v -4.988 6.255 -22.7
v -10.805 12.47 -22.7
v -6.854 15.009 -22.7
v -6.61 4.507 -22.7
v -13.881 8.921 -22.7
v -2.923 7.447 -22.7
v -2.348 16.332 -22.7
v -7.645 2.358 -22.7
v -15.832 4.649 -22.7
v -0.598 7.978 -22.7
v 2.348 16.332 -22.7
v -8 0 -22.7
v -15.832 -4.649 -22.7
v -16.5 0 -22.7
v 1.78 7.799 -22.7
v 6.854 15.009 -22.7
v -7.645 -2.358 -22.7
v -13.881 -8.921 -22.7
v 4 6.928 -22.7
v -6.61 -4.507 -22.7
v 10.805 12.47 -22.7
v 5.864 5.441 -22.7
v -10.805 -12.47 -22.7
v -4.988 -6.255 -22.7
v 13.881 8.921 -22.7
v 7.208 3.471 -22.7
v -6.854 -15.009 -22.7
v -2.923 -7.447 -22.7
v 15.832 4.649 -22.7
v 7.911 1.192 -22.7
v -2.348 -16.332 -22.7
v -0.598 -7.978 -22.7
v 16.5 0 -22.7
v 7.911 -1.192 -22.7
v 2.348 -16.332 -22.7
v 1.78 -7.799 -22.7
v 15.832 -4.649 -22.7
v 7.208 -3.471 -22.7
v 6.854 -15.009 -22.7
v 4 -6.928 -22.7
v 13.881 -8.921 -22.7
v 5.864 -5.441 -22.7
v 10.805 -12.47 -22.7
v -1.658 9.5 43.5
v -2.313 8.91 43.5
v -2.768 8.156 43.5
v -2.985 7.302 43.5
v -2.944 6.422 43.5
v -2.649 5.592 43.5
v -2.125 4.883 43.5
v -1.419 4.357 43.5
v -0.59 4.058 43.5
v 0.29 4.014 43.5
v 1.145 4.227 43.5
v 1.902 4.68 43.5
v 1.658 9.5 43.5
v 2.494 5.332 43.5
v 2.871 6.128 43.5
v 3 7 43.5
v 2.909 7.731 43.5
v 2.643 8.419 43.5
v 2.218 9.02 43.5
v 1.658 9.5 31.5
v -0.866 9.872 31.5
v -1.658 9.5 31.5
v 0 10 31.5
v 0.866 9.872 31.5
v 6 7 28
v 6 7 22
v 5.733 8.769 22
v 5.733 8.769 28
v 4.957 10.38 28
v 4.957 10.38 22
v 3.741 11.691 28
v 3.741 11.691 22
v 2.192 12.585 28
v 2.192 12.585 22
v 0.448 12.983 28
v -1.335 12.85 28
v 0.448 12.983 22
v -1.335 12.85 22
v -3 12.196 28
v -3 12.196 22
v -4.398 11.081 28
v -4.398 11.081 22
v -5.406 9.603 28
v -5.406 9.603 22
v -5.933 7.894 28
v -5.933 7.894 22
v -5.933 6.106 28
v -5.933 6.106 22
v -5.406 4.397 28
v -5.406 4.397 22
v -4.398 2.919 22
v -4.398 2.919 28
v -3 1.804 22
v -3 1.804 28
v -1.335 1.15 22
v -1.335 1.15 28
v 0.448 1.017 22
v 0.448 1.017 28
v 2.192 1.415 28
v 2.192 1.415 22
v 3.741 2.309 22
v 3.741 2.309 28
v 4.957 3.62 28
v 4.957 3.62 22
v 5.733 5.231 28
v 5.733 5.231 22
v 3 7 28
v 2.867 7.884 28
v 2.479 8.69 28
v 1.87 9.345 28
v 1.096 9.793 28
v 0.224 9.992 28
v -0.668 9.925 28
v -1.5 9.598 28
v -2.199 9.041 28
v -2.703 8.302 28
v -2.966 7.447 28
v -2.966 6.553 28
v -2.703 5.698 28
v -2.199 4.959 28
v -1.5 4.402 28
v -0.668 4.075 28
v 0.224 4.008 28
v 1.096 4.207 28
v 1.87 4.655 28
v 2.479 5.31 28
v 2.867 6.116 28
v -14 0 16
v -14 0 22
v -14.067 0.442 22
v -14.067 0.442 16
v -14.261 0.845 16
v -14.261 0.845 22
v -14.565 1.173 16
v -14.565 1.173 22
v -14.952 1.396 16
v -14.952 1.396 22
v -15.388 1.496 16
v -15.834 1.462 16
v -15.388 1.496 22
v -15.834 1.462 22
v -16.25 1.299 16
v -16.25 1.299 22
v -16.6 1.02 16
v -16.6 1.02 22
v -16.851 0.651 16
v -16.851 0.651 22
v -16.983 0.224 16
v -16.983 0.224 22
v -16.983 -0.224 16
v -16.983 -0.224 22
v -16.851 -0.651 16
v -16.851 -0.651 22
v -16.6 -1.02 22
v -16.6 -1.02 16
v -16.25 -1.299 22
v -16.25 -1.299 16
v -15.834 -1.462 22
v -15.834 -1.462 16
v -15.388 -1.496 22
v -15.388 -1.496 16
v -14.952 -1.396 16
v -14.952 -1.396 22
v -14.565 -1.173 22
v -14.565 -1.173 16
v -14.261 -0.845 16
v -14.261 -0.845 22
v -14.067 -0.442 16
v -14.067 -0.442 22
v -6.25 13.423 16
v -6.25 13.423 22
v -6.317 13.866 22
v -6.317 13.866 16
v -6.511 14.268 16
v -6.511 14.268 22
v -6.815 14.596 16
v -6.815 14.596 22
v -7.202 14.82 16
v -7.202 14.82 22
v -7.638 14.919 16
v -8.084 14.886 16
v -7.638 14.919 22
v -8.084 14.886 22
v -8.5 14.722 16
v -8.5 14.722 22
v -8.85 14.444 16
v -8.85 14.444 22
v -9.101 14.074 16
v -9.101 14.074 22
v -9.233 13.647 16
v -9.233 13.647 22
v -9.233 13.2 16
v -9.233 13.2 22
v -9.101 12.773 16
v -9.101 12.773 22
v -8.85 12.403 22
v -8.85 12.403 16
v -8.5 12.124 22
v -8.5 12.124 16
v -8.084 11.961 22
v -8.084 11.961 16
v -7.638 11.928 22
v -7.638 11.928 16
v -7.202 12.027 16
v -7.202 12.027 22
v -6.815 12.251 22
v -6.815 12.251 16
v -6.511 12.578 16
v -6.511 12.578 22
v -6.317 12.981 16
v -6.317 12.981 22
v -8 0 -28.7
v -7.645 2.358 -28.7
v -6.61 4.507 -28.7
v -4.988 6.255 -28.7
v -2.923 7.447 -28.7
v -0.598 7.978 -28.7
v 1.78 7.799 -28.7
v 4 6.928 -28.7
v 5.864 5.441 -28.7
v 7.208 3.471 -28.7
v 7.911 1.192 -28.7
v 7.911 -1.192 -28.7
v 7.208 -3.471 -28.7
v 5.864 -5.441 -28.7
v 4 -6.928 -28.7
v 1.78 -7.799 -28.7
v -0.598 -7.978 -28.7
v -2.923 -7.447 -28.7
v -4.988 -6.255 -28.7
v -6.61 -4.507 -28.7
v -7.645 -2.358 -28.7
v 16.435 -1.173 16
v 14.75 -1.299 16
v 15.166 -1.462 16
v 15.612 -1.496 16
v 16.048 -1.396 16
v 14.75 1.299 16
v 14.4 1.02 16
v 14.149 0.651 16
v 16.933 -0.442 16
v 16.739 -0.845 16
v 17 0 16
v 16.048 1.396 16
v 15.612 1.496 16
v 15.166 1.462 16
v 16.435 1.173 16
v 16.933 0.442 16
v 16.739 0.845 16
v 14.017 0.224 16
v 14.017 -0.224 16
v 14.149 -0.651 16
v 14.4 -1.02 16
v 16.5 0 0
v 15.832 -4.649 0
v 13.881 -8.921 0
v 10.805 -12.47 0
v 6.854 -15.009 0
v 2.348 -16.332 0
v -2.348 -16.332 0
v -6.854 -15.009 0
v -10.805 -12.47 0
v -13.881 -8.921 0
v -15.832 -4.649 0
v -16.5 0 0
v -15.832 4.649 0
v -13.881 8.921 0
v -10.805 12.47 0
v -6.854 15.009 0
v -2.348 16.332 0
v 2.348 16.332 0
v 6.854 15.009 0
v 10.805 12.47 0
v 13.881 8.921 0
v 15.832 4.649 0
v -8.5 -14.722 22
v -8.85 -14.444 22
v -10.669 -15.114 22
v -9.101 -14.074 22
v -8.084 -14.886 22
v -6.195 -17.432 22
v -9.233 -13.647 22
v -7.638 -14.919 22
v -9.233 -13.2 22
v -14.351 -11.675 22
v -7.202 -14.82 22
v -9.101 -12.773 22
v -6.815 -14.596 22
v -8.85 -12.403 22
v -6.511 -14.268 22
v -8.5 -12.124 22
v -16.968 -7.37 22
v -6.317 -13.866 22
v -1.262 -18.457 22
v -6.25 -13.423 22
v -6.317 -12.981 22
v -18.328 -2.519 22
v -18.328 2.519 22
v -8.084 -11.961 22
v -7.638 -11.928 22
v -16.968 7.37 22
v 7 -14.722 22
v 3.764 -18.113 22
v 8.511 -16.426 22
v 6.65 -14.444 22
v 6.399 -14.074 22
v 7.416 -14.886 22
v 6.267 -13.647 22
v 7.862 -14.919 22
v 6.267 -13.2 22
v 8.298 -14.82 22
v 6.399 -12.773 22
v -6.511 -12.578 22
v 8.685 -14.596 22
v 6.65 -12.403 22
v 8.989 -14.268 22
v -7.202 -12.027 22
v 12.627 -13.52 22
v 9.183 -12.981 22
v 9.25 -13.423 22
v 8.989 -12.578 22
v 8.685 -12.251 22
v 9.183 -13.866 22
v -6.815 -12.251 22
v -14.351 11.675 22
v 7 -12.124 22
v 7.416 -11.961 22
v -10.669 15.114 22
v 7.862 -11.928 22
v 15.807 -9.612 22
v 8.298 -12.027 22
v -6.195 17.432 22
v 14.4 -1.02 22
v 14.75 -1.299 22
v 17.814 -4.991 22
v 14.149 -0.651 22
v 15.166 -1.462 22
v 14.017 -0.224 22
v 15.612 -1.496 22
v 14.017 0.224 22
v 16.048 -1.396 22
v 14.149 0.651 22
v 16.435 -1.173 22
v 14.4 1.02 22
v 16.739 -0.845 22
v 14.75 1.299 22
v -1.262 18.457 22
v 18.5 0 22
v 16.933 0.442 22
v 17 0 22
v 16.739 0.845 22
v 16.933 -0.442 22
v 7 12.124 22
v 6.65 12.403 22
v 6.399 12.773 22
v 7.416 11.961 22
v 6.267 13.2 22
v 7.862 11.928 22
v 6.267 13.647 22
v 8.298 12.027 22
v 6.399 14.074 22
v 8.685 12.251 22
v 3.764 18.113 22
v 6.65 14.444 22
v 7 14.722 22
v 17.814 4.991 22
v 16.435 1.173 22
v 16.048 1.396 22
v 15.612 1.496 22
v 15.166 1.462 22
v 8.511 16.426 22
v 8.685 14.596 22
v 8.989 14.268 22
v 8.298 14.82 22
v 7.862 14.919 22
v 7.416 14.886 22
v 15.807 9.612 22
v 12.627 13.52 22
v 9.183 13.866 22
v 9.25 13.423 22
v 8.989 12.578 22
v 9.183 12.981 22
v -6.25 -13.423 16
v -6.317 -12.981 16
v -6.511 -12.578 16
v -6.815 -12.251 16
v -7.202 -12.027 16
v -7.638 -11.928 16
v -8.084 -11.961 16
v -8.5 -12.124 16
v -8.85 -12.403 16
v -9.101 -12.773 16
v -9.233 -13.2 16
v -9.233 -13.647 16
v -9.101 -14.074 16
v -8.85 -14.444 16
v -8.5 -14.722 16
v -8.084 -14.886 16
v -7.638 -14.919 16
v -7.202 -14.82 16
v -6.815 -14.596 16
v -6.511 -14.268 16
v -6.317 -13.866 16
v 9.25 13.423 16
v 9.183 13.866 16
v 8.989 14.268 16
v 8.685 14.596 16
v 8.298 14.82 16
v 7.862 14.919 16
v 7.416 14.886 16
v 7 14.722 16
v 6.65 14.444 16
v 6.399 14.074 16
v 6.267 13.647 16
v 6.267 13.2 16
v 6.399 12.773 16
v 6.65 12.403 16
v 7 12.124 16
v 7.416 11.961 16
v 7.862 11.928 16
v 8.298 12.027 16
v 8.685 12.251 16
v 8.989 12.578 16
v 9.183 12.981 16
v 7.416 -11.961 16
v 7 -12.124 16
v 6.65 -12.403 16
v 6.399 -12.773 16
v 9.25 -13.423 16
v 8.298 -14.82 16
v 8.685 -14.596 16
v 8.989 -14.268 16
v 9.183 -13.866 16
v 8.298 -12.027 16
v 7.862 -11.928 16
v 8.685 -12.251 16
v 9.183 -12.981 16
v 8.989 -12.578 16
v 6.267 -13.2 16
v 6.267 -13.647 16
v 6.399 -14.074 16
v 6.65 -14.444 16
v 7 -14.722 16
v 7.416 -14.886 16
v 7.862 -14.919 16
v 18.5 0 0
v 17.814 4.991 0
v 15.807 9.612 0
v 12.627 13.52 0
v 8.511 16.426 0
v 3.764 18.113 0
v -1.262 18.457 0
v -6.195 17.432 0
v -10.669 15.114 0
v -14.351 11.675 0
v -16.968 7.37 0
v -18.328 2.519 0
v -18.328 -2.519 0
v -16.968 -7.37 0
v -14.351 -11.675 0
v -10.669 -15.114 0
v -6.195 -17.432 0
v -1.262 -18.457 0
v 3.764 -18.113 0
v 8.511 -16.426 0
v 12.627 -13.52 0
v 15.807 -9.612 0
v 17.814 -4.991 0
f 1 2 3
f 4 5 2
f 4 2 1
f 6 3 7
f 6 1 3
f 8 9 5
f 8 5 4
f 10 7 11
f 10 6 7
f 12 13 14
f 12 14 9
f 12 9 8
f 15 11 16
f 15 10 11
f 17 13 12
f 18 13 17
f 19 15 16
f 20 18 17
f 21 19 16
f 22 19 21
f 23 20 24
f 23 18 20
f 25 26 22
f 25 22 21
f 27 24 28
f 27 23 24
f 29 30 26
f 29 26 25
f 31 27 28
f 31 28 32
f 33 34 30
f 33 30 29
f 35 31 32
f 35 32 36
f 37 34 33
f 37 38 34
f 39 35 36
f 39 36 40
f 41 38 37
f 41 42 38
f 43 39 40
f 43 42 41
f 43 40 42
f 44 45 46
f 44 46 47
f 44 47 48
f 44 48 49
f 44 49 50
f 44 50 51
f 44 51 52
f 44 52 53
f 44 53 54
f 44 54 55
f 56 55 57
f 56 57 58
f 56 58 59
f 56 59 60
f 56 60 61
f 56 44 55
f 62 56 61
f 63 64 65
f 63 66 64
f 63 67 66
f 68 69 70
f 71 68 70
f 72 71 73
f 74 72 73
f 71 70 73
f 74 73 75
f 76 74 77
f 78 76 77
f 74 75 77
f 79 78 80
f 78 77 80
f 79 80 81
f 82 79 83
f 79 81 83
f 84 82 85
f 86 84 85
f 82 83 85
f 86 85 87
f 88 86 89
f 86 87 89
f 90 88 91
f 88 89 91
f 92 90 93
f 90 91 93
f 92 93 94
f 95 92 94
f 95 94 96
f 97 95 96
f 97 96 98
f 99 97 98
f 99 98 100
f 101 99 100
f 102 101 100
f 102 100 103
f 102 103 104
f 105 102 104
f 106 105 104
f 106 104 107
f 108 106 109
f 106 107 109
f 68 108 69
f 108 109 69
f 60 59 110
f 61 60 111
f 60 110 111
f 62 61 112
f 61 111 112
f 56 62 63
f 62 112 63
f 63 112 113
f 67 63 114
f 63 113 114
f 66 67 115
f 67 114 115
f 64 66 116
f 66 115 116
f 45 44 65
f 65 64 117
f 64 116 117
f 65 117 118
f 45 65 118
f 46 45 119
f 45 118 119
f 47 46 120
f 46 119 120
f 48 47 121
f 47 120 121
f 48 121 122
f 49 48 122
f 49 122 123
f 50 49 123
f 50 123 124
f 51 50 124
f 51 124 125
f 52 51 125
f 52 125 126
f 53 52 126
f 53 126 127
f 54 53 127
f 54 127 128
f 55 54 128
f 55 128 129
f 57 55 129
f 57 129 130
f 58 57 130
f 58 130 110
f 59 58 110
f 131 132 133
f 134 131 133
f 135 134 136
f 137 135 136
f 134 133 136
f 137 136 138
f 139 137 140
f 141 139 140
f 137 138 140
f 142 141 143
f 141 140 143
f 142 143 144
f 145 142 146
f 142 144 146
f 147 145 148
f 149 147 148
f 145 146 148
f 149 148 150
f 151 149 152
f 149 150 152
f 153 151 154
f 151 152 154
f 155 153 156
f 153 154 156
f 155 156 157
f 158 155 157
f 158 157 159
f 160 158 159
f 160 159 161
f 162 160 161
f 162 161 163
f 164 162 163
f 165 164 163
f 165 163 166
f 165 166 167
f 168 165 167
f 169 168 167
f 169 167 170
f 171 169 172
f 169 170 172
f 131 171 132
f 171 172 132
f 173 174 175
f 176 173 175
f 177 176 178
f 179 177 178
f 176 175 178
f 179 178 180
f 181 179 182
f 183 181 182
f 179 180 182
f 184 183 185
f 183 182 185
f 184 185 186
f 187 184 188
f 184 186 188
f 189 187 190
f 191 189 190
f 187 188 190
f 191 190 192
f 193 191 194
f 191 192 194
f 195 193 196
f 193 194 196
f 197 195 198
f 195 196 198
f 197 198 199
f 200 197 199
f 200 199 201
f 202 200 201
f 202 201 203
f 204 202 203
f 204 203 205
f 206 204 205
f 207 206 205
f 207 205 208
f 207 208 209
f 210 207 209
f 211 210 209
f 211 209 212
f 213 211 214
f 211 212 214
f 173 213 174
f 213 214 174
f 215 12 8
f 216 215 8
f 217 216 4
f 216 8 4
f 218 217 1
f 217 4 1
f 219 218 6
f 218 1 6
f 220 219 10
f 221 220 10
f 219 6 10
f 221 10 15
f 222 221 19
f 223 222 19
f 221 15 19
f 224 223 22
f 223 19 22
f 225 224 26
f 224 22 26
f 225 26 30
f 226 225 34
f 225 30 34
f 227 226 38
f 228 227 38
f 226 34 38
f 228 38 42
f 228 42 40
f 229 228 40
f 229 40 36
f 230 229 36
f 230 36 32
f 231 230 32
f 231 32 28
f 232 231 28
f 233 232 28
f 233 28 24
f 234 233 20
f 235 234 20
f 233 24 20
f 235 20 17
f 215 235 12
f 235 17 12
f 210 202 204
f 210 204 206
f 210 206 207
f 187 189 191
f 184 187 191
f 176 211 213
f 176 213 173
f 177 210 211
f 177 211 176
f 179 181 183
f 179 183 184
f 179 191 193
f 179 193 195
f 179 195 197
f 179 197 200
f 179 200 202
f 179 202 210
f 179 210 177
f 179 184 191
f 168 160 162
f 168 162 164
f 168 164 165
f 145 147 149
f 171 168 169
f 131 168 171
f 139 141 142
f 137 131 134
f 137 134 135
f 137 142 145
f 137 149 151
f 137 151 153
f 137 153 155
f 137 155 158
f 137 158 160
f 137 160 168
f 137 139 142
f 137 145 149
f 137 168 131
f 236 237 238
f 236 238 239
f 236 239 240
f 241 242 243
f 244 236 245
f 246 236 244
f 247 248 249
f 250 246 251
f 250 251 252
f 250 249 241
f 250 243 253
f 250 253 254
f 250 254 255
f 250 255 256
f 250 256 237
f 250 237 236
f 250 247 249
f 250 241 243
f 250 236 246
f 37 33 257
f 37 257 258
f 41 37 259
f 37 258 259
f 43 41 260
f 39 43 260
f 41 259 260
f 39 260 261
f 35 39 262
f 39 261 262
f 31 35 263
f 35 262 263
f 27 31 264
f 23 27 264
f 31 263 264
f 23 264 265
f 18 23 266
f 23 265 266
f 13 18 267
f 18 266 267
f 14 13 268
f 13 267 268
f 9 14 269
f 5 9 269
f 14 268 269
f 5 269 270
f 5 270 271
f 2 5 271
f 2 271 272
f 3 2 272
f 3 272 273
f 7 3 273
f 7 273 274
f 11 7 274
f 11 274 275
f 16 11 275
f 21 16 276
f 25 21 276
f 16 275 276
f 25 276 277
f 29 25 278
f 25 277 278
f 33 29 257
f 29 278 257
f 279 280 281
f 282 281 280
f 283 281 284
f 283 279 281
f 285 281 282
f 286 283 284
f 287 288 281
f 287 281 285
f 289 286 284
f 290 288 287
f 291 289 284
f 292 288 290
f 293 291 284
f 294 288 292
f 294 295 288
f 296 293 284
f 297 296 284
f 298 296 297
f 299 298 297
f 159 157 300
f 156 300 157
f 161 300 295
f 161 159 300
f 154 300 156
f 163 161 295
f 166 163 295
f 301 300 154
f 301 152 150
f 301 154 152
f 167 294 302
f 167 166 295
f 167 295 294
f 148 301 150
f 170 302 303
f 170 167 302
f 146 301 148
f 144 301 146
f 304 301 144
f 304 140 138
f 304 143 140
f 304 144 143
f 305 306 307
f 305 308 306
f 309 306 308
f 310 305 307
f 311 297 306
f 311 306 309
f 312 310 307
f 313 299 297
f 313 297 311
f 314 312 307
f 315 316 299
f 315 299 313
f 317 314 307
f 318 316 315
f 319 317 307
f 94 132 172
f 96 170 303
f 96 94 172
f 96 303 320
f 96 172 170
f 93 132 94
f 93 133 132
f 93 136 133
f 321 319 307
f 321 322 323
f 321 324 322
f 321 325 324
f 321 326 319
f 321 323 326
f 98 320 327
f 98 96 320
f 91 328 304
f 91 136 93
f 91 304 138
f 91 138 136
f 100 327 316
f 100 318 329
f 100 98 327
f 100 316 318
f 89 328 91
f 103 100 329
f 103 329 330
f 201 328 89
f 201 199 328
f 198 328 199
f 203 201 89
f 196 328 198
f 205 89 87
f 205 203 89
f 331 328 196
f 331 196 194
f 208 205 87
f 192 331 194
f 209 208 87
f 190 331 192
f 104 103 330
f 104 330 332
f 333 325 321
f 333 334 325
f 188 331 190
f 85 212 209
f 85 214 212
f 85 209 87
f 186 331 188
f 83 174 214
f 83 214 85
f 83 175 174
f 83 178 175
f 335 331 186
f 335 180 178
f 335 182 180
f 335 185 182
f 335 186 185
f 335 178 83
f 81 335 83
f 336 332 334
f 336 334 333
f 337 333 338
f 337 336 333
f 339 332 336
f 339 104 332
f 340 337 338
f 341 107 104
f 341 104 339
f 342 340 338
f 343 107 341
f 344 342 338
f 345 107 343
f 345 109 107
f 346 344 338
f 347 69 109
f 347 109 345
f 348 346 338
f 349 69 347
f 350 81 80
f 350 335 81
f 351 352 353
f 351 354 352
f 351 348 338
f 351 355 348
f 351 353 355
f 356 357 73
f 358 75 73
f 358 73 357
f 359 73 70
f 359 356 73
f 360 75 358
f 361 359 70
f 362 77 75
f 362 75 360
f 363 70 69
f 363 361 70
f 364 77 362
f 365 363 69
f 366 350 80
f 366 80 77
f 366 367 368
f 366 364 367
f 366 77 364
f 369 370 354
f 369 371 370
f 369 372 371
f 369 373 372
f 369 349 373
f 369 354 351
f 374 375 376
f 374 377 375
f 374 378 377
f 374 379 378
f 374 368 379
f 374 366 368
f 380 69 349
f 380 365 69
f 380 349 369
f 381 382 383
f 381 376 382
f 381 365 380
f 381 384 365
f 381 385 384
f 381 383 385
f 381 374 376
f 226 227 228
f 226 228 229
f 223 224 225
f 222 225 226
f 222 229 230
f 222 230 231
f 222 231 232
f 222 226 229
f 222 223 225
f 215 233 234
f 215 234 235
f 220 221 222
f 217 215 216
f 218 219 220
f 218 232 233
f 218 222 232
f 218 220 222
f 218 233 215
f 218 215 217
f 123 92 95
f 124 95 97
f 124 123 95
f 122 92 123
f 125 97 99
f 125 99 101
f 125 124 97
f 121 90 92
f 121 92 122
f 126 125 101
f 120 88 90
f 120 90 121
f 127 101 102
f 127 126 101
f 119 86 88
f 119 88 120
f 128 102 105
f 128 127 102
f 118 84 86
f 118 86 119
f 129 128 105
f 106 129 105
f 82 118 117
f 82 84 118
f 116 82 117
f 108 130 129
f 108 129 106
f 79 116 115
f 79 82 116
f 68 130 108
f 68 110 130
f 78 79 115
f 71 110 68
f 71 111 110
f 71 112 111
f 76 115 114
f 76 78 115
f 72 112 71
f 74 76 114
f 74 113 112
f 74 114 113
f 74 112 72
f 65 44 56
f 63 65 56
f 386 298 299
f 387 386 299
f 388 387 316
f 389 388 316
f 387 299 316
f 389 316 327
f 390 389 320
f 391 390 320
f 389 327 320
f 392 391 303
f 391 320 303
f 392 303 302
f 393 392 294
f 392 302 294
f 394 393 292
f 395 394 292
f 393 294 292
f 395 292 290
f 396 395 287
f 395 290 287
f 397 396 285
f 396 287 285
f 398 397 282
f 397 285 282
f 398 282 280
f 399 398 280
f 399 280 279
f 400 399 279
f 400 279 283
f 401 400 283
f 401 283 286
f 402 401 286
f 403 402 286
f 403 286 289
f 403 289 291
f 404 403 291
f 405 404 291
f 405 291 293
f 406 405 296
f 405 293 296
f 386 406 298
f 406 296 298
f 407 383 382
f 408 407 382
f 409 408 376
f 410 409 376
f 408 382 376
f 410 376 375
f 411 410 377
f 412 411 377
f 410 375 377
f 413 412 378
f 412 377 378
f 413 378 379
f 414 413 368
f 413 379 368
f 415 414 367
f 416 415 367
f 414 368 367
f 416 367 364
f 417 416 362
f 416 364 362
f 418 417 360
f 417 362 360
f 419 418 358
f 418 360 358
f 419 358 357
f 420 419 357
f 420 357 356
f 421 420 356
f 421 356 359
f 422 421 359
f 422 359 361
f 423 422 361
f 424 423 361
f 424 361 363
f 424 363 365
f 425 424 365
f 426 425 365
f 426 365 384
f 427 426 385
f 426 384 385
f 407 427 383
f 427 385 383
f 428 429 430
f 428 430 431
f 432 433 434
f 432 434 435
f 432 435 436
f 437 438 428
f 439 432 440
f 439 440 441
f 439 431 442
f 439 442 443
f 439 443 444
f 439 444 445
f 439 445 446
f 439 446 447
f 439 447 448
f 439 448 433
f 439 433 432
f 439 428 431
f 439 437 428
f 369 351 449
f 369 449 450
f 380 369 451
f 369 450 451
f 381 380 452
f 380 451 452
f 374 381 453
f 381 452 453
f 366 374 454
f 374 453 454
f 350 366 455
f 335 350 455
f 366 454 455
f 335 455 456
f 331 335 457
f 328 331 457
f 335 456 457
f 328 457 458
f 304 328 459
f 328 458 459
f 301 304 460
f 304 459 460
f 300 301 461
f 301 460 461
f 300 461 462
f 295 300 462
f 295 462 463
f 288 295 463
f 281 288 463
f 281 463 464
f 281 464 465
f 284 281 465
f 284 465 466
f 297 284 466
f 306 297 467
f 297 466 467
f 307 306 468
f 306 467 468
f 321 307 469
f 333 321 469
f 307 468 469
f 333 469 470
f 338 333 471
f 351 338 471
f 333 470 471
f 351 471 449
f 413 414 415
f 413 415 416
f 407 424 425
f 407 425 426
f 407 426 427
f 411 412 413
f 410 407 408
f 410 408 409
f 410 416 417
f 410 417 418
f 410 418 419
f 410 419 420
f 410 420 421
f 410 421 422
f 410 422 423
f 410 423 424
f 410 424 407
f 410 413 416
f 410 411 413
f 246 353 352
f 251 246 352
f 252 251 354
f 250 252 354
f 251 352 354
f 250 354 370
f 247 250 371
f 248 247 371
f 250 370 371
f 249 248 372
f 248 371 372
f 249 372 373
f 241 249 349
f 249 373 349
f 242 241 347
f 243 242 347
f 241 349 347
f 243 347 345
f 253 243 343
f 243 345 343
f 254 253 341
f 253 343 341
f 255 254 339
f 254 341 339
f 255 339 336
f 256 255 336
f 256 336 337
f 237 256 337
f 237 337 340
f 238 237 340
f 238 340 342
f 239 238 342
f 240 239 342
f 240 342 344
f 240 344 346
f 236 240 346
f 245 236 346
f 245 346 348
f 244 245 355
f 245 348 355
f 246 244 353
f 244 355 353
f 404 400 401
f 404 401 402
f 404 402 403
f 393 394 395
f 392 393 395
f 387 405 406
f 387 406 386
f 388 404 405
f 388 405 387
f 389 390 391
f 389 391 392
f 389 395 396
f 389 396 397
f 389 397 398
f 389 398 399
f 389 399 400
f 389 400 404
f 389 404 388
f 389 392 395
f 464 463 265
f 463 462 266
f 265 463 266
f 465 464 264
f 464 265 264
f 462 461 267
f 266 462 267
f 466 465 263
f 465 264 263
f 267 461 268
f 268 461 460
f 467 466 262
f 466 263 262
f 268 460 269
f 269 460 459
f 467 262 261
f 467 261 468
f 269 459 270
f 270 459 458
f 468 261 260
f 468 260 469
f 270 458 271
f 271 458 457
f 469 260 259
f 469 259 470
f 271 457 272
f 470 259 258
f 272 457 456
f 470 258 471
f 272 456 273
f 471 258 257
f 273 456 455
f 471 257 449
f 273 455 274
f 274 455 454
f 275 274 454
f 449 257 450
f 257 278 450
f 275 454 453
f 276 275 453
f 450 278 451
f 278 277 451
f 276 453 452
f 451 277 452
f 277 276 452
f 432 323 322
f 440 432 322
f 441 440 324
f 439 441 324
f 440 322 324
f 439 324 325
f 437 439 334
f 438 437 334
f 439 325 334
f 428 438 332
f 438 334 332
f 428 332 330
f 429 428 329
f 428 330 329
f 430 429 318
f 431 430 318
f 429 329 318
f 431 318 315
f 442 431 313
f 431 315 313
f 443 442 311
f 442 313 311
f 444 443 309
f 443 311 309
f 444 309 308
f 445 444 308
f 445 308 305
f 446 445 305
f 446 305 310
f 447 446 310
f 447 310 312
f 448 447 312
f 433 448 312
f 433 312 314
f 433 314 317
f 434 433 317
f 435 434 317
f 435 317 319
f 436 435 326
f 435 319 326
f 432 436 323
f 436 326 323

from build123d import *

# Parameters (mm, degrees)
SKETCH_1_R          = 18.5
EXTRUDE_1_DEPTH     = 22
SKETCH_2_R          = 6
EXTRUDE_2_DEPTH     = 6
SKETCH_3_R          = 3
EXTRUDE_3_DEPTH     = 15.5
CUT_EXTRUDE_1_DEPTH = 12
SKETCH_5_R          = 1.5
CUT_EXTRUDE_2_DEPTH = 6
SKETCH_6_R          = 16.5
EXTRUDE_4_DEPTH     = 22.7
SKETCH_7_R          = 8
EXTRUDE_5_DEPTH     = 6


with BuildPart() as part:
    # 草图1 → 凸台-拉伸1 (new body)
    with BuildSketch(Plane.XY):
        Circle(SKETCH_1_R)
    extrude(amount=EXTRUDE_1_DEPTH)

    # 草图2 → 凸台-拉伸2 (add)
    with BuildSketch(Plane.XY.offset(22)):
        with Locations((0, 7)):
            Circle(SKETCH_2_R)
    extrude(amount=EXTRUDE_2_DEPTH)

    # 草图3 → 凸台-拉伸3 (add)
    with BuildSketch(Plane.XY.offset(28)):
        with Locations((0, 7)):
            Circle(SKETCH_3_R)
    extrude(amount=EXTRUDE_3_DEPTH)

    # 草图4 → 切除-拉伸1 (cut)
    with BuildSketch(Plane.XY.offset(43.5)):
        Polygon((-3.340950009, 9.5), (3.684231377, 9.5), (0.516334163, 11.681498446), align=None)
    extrude(amount=-CUT_EXTRUDE_1_DEPTH, mode=Mode.SUBTRACT)

    # 草图5 → 切除-拉伸2 (cut)
    with BuildSketch(Plane.XY.offset(22)):
        with Locations((15.5, 0)):
            Circle(SKETCH_5_R)
        with Locations((7.75, -13.423393759)):
            Circle(SKETCH_5_R)
        with Locations((-7.75, -13.423393759)):
            Circle(SKETCH_5_R)
        with Locations((-15.5, 0)):
            Circle(SKETCH_5_R)
        with Locations((-7.75, 13.423393759)):
            Circle(SKETCH_5_R)
        with Locations((7.75, 13.423393759)):
            Circle(SKETCH_5_R)
    extrude(amount=-CUT_EXTRUDE_2_DEPTH, mode=Mode.SUBTRACT)

    # 草图6 → 凸台-拉伸4 (add)
    with BuildSketch(Plane(origin=(0, 0, 0), x_dir=(-1, 0, 0), z_dir=(0, 0, -1))):
        with Locations(Location((0, 0, 0), (0, 0, 180))):
            Circle(SKETCH_6_R)
    extrude(amount=EXTRUDE_4_DEPTH)

    # 草图7 → 凸台-拉伸5 (add)
    with BuildSketch(Plane(origin=(0, 0, -22.7), x_dir=(-1, 0, 0), z_dir=(0, 0, -1))):
        Circle(SKETCH_7_R)
    extrude(amount=EXTRUDE_5_DEPTH)


solid = part.part
